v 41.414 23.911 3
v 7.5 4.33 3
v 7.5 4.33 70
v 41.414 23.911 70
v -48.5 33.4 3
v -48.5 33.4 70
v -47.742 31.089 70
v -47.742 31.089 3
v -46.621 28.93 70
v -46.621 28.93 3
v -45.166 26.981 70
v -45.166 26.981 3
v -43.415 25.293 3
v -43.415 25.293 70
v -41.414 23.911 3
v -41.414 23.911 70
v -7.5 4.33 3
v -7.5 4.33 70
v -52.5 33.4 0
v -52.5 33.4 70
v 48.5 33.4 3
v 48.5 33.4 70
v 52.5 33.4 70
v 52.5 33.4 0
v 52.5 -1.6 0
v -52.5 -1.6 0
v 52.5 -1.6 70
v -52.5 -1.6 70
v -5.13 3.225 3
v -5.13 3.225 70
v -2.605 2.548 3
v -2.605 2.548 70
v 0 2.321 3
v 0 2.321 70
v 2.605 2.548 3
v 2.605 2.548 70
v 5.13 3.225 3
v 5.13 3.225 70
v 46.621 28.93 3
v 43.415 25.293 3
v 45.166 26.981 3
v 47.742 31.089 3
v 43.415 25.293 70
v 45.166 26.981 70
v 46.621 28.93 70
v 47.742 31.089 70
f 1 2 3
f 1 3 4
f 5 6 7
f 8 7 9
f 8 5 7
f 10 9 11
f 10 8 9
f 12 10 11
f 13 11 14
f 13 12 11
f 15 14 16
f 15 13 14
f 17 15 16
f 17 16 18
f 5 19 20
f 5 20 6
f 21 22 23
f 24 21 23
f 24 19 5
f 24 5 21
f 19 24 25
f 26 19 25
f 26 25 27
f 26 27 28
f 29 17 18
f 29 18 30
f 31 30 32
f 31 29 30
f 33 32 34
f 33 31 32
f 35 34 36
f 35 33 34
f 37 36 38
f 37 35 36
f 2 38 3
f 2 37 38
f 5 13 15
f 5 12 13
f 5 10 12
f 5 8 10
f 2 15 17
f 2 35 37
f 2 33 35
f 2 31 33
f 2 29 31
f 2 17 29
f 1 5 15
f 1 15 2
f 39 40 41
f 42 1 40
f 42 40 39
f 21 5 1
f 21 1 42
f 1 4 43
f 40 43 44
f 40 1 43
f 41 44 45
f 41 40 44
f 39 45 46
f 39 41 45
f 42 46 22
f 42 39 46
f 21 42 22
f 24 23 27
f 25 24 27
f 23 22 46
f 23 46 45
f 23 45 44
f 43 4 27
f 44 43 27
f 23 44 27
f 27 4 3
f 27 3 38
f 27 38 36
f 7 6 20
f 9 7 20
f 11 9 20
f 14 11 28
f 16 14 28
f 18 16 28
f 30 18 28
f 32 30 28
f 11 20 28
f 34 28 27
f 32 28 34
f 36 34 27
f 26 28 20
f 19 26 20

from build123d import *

# Parameters (mm, degrees)
BOSS_EXTRU_1_DEPTH = 70
CONG_1_R           = 15
ESQUISSE2_W        = 105
ESQUISSE2_H        = 35
BOSS_EXTRU_2_DEPTH = 3


with BuildPart() as part:
    # Esquisse1 → Boss.-Extru.1 (new body)
    with BuildSketch(Plane.XY):
        Polygon((0, 0), (48.5, 28.001488056), (48.5, 33.4), (52.5, 33.4), (52.5, -1.6), (-52.5, -1.6), (-52.5, 33.4), (-48.5, 33.4), (-48.5, 28.001488056), align=None)
    extrude(amount=BOSS_EXTRU_1_DEPTH)

    # Congé1
    # the kernel refuses this fillet: 15 mm, written as the material it adds along each edge
    with BuildSketch(Plane(origin=(0, 0, 0), x_dir=(0.866025403784438, 0.5000000000000011, 0), z_dir=(0, 0, 1))) as cong_1_piece_1:
        with BuildLine():
            CenterArc((CONG_1_R * 0.57735026919, CONG_1_R), CONG_1_R, 210, 60)
            Line((-CONG_1_R * 0.288675134595, CONG_1_R * 0.5), (-CONG_1_R * 0.305995642671, CONG_1_R * 0.49))
            Line((-CONG_1_R * 0.305995642671, CONG_1_R * 0.49), (-CONG_1_R * 0.0115470053838, -CONG_1_R * 0.02))
            Line((-CONG_1_R * 0.0115470053838, -CONG_1_R * 0.02), (CONG_1_R * 0.57735026919, -CONG_1_R * 0.02))
            Line((CONG_1_R * 0.57735026919, -CONG_1_R * 0.02), (CONG_1_R * 0.57735026919, 0))
        make_face()
    extrude(amount=70)
    with BuildSketch(Plane(origin=(48.5, 28.001488056, 0), x_dir=(-0.8660254037844379, -0.5000000000000011, 0), z_dir=(0, 0, 1))) as cong_1_piece_2:
        with BuildLine():
            CenterArc((8.181897743, -15), CONG_1_R, 90, 46.502986309)
            Line((-2.699255972, -4.675248486), (-2.916879046, -4.468753456))
            ThreePointArc((-2.916879046, -4.468753456), (-1.609435607, -2.187624243), (-0.259807621, 0.15))
            Line((-0.259807621, 0.15), (0, 0.3))
            Line((0, 0.3), (8.181897743, 0.3))
            Line((8.181897743, 0.3), (8.181897743, 0))
        make_face()
    extrude(amount=70)
    with BuildSketch(Plane(origin=(-48.5, 28.001488056, 0), x_dir=(0, 1, 0), z_dir=(0, 0, 1))) as cong_1_piece_3:
        with BuildLine():
            CenterArc((8.899432185, -14.585731297), CONG_1_R, 103.497013691, 46.502986309)
            Line((-4.090948872, -7.085731297), (-4.350756493, -6.935731297))
            Line((-4.350756493, -6.935731297), (-0.259807621, 0.15))
            Line((-0.259807621, 0.15), (0, 0.3))
            ThreePointArc((0, 0.3), (2.699255972, 0.3), (5.328493539, 0.291714626))
            Line((5.328493539, 0.291714626), (5.398511944, 0))
        make_face()
    extrude(amount=70)

    # Esquisse2 → Boss.-Extru.2 (add)
    with BuildSketch(Plane.XY):
        with Locations((0, 15.9)):
            Rectangle(ESQUISSE2_W, ESQUISSE2_H)
    extrude(amount=BOSS_EXTRU_2_DEPTH)


solid = part.part
